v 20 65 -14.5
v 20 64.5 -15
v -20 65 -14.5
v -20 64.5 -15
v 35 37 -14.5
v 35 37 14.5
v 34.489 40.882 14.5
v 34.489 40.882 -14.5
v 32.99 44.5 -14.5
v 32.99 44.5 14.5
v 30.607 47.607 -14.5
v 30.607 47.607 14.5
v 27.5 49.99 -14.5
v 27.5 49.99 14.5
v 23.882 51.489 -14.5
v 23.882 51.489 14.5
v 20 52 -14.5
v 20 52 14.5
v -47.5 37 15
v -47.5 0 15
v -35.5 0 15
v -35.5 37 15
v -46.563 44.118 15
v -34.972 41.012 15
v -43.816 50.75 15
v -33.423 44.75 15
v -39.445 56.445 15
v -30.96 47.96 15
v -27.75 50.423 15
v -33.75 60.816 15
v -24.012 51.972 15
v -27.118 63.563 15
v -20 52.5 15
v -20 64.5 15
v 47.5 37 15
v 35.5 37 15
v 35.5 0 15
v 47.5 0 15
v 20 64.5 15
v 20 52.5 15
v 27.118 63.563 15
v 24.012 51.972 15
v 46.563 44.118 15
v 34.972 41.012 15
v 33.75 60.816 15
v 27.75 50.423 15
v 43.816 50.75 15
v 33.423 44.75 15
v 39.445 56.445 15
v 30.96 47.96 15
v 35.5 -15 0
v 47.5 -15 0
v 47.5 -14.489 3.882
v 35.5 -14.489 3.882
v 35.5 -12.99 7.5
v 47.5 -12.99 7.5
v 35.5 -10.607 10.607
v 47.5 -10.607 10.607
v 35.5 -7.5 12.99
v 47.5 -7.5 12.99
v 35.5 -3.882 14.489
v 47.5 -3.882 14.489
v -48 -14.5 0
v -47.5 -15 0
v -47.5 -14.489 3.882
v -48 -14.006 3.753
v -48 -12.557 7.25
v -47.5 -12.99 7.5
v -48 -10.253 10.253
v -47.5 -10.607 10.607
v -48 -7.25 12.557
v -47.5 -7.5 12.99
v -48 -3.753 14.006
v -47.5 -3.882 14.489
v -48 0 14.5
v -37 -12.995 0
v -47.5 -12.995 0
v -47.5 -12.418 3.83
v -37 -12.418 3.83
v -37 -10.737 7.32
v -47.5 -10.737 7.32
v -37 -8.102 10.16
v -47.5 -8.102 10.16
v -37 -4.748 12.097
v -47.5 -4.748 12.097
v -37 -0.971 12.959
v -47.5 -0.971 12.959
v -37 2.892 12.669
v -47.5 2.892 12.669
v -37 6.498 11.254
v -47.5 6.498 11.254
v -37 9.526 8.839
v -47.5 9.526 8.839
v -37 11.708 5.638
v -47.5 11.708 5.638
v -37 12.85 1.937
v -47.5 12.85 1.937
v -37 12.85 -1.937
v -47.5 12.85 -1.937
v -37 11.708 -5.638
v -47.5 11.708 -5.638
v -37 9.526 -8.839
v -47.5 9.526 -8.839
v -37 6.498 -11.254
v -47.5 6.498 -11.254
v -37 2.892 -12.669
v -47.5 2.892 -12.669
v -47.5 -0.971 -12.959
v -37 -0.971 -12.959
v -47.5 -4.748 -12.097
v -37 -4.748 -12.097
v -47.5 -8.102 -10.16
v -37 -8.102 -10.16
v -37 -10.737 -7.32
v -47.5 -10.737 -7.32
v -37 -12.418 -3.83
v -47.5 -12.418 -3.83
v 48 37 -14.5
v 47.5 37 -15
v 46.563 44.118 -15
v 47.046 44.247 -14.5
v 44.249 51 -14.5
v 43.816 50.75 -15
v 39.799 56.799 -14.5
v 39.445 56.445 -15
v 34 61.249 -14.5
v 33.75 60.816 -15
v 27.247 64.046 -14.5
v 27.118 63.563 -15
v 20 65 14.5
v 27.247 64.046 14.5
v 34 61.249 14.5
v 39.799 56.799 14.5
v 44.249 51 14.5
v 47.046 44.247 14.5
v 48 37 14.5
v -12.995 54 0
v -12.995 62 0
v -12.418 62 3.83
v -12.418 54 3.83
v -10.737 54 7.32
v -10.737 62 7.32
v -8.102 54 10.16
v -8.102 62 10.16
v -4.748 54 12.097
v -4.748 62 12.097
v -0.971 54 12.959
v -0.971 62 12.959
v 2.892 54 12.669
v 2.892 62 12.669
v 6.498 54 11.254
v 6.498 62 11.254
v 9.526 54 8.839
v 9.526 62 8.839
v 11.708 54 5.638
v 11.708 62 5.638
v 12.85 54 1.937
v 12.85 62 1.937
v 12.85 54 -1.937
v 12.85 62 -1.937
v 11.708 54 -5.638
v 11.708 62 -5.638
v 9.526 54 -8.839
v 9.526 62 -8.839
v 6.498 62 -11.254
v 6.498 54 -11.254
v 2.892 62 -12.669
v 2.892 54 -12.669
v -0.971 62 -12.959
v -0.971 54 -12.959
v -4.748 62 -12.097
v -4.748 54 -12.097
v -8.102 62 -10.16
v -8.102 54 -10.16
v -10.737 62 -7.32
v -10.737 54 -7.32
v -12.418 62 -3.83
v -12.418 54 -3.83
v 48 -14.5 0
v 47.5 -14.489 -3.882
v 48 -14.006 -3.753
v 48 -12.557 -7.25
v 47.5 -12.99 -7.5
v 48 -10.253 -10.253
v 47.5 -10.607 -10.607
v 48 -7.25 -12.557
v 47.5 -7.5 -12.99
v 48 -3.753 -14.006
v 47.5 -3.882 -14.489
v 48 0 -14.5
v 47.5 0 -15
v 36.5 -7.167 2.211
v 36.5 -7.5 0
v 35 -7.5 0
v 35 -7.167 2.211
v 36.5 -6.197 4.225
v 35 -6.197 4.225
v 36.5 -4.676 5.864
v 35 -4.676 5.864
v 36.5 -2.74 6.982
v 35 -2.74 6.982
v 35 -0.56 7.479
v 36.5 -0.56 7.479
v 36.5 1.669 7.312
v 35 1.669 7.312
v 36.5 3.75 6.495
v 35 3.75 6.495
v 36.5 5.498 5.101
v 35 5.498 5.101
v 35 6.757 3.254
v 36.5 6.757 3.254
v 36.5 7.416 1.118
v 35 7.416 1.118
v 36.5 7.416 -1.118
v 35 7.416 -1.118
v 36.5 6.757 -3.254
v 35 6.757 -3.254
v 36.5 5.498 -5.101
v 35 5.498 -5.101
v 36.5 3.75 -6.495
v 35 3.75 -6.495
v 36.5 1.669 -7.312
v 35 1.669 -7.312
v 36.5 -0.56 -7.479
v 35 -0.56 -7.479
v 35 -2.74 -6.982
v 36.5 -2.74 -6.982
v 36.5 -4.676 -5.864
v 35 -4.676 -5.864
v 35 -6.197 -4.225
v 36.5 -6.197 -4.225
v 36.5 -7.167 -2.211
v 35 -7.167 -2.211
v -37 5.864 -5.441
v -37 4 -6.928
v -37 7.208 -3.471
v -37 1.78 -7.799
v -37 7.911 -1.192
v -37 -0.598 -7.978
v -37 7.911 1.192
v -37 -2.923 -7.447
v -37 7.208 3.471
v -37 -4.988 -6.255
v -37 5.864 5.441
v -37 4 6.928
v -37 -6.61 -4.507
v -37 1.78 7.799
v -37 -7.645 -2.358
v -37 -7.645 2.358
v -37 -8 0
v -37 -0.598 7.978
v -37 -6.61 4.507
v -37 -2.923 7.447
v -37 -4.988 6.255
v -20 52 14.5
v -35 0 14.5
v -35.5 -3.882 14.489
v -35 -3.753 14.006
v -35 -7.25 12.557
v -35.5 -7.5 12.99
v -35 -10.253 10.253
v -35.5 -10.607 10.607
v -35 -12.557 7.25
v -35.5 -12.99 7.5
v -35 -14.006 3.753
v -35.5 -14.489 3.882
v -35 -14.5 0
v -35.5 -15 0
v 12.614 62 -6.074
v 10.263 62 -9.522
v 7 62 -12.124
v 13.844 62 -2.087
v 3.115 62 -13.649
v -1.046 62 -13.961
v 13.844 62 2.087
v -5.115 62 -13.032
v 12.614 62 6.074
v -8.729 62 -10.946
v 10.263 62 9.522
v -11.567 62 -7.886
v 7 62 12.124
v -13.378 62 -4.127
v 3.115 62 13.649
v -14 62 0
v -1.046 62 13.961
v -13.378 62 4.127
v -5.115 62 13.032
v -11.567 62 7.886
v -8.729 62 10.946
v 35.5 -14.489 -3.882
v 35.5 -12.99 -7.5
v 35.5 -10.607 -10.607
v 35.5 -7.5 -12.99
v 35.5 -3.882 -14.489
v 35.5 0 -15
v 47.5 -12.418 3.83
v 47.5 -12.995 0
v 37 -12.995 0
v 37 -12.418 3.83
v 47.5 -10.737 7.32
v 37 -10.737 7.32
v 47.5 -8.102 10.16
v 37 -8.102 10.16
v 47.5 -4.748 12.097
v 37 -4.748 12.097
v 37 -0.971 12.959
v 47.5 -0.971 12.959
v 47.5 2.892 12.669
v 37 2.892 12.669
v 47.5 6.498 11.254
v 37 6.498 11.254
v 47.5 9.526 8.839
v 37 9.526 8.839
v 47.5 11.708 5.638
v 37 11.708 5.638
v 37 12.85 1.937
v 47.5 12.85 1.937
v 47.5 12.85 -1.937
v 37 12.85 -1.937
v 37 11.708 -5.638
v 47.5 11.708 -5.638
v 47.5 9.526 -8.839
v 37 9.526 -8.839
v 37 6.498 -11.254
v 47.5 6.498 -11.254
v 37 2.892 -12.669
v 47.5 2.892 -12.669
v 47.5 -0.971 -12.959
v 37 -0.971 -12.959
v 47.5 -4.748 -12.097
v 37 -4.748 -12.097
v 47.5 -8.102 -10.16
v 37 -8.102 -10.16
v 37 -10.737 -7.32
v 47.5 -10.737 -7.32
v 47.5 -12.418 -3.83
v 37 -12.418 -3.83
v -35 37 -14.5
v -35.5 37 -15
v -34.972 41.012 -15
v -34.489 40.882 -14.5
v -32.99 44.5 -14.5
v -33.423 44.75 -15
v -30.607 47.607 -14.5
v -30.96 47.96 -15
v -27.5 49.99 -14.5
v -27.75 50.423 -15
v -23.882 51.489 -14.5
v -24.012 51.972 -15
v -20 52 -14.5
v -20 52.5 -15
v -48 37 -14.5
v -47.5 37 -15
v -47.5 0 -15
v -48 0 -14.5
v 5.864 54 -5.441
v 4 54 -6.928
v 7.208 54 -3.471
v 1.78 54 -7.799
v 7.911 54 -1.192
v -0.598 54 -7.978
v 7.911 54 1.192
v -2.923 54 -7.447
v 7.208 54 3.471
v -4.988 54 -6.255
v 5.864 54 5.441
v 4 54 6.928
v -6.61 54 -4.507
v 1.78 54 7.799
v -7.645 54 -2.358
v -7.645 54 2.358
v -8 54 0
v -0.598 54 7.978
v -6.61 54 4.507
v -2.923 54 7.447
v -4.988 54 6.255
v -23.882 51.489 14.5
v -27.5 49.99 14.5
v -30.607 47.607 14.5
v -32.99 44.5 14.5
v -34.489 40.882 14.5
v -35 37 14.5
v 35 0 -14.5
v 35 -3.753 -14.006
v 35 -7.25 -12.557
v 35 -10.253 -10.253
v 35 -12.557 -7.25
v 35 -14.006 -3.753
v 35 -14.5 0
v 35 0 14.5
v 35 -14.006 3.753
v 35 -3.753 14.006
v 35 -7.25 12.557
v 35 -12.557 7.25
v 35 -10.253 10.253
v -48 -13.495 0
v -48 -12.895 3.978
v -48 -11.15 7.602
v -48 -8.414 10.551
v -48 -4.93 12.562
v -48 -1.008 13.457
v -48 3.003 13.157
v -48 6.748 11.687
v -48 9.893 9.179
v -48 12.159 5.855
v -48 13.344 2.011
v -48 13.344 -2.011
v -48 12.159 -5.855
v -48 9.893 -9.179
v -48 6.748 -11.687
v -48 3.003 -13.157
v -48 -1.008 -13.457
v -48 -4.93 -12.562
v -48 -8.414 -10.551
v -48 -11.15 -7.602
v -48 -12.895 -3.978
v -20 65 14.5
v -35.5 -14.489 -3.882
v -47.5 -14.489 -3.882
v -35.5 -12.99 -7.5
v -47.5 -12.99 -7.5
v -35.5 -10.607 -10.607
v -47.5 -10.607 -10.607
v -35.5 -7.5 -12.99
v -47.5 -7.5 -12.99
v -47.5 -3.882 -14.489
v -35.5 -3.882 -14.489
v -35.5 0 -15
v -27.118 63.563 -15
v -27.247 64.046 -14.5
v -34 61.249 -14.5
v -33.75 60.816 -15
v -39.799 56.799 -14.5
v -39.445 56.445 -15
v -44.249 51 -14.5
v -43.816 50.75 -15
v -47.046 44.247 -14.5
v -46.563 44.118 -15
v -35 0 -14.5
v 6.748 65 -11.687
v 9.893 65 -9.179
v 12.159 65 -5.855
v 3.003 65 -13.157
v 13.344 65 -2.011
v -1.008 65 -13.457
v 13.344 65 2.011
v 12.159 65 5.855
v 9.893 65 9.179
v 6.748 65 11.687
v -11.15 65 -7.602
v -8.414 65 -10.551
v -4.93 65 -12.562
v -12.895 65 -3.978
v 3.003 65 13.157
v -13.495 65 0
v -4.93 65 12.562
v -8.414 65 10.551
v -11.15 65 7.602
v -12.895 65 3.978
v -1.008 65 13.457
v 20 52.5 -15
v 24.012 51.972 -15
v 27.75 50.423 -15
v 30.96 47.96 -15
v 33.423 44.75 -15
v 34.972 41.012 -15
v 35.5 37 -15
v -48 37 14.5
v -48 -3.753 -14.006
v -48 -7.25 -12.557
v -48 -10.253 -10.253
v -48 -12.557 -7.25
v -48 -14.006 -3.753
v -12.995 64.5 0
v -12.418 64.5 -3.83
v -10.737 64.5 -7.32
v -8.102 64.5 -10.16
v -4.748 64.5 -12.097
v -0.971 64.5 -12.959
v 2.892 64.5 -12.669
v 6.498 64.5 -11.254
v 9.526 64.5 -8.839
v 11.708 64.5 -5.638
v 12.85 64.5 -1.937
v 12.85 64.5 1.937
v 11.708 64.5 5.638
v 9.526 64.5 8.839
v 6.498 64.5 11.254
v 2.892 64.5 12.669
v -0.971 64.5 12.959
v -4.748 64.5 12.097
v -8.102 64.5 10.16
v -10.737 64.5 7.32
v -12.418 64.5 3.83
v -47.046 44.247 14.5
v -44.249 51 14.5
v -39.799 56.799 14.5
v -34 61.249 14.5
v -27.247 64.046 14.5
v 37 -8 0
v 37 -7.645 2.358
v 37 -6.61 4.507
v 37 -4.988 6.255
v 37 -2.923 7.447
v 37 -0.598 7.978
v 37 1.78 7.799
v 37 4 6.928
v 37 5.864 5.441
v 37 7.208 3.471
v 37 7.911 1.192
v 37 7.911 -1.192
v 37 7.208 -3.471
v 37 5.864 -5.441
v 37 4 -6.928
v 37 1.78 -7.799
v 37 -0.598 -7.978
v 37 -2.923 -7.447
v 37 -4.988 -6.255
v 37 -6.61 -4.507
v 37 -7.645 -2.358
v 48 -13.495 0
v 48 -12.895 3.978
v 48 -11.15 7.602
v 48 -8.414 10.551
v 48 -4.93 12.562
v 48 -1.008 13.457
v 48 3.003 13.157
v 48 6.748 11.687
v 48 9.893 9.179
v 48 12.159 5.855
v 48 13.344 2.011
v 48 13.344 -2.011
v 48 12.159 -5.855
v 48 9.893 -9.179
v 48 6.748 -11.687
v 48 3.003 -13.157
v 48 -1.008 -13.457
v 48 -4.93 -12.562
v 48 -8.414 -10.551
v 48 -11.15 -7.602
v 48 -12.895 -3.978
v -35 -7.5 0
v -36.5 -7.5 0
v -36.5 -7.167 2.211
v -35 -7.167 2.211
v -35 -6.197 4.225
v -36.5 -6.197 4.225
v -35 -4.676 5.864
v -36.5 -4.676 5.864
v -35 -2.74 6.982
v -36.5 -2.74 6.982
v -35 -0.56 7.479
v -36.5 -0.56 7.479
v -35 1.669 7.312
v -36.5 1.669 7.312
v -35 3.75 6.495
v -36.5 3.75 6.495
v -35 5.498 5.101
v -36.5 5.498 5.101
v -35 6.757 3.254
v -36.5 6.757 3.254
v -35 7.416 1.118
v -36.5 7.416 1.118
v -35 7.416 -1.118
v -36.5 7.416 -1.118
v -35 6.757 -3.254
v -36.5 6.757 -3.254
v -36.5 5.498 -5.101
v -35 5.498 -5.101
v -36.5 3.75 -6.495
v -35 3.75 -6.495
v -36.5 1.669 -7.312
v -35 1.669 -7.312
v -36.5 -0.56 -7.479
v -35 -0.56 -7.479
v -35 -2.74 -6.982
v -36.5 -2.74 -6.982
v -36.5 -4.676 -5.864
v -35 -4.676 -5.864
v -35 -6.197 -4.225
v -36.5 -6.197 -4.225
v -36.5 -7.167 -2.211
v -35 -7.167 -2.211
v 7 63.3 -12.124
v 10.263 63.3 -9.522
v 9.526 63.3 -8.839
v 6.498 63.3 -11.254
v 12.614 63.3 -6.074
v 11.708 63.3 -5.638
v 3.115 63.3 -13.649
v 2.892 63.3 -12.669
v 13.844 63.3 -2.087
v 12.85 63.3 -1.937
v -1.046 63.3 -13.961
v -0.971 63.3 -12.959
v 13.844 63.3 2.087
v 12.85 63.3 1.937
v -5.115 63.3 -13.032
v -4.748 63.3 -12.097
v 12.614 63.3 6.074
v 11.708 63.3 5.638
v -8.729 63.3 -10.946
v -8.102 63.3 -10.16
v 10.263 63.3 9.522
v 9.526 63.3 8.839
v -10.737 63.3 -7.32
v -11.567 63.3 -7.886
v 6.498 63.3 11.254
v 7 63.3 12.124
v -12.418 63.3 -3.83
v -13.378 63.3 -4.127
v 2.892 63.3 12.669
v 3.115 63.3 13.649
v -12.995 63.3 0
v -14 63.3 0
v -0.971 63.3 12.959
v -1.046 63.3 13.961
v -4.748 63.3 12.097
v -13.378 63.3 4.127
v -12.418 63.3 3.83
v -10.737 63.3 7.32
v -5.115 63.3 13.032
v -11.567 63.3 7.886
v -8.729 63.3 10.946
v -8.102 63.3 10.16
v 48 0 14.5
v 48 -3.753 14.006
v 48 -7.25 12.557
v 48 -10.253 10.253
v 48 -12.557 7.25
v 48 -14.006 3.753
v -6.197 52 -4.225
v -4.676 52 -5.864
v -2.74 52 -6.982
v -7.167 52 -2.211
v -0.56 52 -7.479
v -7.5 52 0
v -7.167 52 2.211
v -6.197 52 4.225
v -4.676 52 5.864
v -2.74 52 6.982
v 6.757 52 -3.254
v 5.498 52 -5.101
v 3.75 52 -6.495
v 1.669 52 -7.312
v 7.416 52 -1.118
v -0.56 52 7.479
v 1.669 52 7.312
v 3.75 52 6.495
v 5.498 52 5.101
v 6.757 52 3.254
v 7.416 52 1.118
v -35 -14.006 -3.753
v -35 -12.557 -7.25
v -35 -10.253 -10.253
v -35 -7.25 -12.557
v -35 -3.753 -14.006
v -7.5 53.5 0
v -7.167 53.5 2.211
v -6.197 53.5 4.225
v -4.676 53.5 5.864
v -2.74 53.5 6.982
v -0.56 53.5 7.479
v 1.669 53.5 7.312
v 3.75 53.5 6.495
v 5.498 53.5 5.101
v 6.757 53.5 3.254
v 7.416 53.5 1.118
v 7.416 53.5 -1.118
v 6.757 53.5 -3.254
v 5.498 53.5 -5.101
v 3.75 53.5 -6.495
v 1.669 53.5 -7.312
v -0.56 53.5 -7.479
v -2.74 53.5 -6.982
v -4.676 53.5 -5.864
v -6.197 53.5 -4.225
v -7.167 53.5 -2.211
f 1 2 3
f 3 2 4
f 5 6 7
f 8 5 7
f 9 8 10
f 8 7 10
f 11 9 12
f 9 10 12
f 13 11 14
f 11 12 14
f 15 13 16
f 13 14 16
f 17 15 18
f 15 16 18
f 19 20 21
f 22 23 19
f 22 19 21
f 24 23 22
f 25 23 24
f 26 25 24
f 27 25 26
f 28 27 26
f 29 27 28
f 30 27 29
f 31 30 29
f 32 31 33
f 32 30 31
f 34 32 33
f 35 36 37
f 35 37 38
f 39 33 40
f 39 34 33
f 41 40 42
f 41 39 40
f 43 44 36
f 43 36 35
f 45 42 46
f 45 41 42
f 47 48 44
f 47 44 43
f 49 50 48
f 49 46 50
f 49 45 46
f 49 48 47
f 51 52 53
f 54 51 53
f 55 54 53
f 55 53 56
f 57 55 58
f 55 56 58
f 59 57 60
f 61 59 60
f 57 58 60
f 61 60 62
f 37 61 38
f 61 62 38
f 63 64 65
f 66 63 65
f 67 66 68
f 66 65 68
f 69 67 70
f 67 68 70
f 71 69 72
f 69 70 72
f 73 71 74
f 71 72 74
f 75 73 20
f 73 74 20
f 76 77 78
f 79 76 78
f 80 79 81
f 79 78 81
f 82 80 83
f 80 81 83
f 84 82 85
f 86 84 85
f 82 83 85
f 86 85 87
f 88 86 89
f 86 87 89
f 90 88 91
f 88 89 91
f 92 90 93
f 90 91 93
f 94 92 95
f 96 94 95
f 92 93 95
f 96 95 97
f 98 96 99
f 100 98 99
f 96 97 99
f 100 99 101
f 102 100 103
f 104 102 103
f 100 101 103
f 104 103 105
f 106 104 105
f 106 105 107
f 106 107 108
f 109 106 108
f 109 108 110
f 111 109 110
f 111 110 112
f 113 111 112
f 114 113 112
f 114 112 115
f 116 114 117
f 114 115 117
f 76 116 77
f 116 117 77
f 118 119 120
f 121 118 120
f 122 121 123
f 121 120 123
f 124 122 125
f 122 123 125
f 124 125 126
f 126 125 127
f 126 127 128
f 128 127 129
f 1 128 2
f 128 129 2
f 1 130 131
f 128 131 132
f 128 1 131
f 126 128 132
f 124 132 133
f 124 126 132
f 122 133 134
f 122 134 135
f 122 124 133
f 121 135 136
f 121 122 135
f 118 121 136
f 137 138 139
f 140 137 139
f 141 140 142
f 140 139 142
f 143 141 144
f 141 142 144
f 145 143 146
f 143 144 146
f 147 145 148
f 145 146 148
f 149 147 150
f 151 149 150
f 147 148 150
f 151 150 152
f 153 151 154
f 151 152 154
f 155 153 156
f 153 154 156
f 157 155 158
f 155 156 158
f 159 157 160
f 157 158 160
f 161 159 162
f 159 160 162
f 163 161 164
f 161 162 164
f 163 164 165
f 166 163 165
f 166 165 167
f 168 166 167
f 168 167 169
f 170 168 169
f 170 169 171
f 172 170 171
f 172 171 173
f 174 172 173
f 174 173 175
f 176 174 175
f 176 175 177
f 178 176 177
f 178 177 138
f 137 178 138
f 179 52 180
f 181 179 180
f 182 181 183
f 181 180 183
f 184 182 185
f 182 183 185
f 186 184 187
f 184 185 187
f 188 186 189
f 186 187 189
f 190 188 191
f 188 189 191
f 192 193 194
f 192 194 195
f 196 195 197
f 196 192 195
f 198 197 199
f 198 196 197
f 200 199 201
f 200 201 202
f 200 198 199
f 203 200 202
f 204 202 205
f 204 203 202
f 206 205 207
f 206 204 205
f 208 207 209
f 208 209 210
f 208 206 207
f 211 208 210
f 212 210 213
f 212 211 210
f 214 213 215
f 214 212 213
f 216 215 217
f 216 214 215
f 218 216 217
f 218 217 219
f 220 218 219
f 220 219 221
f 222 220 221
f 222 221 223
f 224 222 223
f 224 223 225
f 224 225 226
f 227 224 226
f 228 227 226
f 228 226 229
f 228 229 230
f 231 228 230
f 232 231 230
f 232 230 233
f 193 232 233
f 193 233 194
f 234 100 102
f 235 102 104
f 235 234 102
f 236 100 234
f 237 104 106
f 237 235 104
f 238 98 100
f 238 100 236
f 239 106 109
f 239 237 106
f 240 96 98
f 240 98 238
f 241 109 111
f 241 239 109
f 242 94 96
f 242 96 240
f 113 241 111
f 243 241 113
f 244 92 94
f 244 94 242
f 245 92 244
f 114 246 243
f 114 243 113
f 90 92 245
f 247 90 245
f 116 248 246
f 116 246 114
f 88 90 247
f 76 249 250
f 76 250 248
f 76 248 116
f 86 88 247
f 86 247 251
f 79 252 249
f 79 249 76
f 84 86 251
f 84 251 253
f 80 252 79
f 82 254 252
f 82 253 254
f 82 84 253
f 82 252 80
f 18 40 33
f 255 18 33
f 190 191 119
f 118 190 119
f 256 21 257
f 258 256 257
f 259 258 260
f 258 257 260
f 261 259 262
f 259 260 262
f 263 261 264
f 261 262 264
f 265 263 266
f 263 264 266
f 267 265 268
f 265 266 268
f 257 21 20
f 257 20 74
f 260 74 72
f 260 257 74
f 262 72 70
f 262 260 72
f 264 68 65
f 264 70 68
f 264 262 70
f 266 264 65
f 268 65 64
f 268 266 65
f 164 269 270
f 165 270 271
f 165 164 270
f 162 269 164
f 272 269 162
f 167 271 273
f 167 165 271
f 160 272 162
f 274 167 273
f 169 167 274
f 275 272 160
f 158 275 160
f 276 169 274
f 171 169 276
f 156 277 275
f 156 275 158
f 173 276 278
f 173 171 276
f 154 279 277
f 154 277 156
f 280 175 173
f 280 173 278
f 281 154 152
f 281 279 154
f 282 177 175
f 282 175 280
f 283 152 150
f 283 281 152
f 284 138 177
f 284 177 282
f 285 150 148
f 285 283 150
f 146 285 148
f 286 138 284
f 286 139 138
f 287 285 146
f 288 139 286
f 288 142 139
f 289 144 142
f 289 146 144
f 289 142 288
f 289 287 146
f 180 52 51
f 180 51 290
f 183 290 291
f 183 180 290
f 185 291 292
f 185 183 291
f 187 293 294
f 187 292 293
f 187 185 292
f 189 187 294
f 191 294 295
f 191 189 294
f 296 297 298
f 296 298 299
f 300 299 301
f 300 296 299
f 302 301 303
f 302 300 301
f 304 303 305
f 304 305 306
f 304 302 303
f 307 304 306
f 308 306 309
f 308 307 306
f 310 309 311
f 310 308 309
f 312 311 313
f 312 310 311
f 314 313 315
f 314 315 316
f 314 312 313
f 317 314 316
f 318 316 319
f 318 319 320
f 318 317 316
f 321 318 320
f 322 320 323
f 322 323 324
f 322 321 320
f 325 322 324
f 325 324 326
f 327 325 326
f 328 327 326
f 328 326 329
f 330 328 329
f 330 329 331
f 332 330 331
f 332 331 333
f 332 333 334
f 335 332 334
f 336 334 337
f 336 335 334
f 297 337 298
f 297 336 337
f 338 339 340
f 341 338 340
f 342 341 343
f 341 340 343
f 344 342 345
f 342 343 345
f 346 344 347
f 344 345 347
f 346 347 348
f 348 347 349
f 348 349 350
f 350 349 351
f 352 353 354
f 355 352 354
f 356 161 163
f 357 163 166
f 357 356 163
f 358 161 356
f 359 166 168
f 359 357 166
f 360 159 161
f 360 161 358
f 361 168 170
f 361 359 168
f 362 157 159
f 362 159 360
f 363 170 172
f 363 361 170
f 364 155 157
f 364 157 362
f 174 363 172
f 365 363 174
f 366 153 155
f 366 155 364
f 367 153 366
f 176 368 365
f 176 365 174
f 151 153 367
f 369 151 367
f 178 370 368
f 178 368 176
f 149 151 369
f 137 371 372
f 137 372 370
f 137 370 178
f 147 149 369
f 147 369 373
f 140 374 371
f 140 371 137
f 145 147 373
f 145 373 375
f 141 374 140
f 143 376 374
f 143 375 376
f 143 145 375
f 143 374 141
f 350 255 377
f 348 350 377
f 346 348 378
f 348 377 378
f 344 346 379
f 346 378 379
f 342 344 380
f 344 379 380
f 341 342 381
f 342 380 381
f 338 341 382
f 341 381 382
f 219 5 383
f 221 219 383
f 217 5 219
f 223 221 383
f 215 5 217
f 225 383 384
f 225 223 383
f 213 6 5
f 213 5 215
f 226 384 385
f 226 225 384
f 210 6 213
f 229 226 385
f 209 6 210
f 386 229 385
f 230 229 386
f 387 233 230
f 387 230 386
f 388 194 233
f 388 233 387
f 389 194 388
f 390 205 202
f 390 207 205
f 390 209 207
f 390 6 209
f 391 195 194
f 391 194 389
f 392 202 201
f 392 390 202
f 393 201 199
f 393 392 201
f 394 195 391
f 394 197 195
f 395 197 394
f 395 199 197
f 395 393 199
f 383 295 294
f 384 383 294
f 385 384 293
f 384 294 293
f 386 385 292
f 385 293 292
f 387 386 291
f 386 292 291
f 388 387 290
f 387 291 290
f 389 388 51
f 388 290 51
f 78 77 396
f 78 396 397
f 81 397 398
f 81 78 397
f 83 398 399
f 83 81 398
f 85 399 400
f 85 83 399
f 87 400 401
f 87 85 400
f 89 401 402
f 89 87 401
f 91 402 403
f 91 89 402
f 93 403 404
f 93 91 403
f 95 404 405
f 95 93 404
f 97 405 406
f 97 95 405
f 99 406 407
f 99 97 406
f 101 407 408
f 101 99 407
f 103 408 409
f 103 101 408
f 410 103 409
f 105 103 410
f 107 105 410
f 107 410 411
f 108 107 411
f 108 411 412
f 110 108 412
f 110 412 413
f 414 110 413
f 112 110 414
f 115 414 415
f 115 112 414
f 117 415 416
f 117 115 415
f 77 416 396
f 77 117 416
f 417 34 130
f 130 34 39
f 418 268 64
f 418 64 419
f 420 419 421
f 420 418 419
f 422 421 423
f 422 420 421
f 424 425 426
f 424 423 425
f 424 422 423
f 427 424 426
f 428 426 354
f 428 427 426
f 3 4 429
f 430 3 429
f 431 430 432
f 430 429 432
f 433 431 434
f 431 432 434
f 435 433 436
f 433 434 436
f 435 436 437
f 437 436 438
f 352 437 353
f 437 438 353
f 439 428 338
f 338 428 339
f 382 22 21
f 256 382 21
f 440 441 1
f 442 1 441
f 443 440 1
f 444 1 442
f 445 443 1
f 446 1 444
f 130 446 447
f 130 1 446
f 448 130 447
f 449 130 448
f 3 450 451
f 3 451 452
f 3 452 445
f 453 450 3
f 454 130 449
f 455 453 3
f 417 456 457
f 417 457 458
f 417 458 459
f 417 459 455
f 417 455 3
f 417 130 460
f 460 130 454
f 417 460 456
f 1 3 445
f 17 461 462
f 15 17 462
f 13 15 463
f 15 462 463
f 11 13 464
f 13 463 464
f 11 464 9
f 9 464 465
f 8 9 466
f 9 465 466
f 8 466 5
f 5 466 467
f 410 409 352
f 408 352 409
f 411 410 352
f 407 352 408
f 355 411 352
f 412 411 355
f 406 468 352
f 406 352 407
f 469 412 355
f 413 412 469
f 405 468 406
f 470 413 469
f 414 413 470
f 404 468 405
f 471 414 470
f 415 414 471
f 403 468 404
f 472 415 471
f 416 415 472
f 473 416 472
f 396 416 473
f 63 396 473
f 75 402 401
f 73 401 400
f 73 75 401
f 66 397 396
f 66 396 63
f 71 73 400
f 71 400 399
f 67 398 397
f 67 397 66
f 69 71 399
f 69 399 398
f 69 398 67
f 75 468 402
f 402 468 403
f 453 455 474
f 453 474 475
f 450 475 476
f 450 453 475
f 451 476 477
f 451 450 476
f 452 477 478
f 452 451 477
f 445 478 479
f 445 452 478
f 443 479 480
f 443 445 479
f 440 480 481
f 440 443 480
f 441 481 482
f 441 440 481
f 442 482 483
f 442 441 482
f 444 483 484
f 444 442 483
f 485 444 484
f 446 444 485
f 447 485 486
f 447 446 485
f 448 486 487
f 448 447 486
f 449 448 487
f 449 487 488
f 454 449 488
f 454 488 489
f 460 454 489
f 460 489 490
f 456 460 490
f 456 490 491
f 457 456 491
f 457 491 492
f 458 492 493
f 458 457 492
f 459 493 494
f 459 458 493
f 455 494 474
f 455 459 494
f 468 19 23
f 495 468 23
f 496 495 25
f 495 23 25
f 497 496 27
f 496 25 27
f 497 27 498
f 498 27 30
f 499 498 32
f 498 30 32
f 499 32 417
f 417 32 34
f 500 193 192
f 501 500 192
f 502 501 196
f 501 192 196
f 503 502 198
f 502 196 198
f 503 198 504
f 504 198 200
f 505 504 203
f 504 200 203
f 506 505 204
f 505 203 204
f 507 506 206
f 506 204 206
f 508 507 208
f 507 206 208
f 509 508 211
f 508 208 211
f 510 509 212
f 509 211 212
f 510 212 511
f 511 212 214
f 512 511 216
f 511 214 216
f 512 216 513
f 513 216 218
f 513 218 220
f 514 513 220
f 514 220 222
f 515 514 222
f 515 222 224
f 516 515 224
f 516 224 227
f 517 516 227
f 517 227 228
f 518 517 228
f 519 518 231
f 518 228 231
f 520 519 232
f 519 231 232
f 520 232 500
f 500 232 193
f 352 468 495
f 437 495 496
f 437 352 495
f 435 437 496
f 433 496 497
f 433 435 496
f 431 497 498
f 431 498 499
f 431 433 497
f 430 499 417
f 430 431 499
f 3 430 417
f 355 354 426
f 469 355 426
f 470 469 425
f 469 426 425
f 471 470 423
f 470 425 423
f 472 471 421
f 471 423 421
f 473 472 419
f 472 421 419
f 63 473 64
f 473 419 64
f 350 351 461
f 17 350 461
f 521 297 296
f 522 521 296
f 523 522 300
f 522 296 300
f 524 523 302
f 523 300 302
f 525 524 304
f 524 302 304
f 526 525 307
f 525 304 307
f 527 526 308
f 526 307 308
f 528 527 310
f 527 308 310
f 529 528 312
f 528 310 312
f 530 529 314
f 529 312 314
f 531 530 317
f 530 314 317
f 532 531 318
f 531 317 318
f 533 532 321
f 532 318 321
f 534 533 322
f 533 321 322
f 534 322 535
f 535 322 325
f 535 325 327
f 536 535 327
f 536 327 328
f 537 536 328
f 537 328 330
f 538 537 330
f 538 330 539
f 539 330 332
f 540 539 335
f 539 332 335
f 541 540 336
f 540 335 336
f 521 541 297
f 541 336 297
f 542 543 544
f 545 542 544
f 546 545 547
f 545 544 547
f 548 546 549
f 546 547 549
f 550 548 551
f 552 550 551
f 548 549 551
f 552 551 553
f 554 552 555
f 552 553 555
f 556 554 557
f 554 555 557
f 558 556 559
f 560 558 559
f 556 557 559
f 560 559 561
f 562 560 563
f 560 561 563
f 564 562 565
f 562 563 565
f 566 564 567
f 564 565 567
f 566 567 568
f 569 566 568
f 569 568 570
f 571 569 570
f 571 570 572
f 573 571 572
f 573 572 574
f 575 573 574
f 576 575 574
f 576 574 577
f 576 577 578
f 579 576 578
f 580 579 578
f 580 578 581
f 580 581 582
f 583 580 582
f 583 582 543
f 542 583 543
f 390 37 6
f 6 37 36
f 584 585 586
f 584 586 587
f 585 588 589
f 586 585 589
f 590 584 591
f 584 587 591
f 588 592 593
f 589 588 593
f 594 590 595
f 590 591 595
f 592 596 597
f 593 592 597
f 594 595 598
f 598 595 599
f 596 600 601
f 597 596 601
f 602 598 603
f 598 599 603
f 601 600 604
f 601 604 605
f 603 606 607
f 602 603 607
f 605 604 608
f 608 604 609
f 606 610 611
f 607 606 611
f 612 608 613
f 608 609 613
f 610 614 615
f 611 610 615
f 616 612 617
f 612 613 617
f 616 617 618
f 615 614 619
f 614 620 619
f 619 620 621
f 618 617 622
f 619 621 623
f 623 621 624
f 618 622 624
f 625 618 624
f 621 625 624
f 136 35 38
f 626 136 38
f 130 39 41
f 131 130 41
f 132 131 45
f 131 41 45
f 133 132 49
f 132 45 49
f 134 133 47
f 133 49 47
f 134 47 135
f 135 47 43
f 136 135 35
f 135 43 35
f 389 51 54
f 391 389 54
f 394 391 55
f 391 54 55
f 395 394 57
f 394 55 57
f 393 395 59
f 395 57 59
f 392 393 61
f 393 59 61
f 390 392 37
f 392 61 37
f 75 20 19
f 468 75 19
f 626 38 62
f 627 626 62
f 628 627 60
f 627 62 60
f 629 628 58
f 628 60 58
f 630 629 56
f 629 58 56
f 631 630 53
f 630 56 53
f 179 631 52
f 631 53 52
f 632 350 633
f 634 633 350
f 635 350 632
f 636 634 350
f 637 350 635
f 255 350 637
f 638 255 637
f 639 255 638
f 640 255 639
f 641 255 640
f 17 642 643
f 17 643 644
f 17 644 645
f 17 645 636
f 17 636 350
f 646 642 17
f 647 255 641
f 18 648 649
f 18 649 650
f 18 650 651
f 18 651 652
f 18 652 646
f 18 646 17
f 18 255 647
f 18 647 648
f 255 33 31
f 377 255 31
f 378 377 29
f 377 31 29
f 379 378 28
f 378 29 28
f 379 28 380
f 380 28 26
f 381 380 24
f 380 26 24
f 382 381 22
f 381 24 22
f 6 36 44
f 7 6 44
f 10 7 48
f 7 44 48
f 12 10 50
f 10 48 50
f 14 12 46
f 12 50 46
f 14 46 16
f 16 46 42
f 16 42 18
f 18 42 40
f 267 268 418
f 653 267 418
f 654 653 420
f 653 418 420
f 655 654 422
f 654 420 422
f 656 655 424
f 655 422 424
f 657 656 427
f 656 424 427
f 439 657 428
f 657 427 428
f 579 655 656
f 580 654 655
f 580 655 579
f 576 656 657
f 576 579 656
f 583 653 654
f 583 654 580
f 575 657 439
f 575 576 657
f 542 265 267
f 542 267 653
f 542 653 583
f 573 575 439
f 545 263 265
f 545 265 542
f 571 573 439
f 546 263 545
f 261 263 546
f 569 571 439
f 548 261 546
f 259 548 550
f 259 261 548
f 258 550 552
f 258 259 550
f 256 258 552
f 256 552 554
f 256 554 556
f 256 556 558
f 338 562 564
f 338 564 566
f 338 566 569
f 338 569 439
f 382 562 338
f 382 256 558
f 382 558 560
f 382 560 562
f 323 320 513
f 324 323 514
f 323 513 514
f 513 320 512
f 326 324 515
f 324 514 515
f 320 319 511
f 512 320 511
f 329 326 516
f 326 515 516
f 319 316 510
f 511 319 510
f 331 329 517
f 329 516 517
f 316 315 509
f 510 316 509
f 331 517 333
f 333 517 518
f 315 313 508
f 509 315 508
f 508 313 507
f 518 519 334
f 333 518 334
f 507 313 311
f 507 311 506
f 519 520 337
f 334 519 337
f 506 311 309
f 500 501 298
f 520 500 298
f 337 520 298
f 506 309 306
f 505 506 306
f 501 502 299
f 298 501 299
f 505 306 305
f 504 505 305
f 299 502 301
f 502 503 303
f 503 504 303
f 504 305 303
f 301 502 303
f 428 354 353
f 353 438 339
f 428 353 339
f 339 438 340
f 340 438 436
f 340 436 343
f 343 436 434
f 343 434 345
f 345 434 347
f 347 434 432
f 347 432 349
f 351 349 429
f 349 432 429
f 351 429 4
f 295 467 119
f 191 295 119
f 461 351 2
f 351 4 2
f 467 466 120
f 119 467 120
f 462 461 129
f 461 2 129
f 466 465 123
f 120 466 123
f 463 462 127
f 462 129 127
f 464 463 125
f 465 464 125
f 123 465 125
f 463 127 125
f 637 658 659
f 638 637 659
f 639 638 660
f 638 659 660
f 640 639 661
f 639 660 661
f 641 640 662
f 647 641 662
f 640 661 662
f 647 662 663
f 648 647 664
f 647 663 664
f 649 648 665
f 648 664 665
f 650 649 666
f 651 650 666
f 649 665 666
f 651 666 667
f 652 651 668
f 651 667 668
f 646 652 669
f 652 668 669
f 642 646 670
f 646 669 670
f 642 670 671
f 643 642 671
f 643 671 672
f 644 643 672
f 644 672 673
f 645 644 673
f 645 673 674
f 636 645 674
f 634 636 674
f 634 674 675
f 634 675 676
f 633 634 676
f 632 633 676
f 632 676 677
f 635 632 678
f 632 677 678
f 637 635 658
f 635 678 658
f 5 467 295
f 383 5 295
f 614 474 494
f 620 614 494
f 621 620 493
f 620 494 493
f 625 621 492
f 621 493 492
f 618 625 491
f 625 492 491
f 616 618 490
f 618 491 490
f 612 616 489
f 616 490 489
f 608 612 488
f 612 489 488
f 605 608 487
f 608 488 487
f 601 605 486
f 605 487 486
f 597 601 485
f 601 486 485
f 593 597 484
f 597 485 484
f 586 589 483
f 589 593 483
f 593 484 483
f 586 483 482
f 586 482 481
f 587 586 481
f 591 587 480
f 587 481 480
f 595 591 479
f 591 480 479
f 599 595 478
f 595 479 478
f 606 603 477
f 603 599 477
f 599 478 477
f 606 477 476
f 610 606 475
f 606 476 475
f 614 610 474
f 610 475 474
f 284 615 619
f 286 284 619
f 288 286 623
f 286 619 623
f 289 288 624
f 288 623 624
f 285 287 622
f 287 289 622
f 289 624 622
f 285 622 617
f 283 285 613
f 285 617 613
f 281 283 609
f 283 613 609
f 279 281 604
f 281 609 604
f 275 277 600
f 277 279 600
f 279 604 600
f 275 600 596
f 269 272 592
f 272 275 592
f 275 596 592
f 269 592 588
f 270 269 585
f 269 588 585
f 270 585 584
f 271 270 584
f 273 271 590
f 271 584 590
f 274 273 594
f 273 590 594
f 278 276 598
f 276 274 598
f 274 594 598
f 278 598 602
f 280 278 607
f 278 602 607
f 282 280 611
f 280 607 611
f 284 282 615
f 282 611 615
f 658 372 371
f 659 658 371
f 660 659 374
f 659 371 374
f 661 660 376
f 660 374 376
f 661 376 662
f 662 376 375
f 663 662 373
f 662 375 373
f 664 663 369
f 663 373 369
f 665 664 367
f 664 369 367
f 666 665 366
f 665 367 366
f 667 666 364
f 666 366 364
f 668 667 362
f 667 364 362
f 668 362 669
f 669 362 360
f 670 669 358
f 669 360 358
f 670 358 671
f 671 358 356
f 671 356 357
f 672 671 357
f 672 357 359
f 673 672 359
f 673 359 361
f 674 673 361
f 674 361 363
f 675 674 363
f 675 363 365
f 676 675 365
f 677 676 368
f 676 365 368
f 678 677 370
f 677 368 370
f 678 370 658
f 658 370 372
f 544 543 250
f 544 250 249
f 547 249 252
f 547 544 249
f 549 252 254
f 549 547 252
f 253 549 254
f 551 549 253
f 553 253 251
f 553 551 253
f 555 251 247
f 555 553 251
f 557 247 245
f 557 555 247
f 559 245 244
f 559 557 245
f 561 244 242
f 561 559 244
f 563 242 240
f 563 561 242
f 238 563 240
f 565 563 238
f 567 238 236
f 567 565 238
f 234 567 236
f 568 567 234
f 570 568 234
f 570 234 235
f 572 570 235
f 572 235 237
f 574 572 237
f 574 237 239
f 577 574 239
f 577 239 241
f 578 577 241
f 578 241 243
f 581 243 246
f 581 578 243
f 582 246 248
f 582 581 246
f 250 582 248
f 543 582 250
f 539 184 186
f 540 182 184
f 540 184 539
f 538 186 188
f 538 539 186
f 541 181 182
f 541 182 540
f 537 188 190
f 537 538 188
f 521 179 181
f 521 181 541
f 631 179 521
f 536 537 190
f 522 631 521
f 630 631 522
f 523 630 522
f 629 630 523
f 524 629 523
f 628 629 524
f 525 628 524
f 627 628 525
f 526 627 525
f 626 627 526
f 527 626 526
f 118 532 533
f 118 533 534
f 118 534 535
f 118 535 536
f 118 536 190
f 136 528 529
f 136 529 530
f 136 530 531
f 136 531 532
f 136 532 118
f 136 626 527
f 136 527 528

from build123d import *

# Parameters (mm, degrees)
F0_W          = 30
F0_H          = 13
F0_W_2        = 13
F0_H_2        = 30
F1_DEPTH      = 15
F1_DEPTH_BACK = 15
F2_R          = 14.99999
F3_R          = 28
F4_R          = 12.995
F4_R_2        = 7.5
F5_DEPTH      = 11
F6_DEPTH      = 13
F7_R          = 12.995
F7_R_2        = 7.5
F8_DEPTH      = 11
F9_DEPTH      = 13
F10_START     = -1.7
F7_R_3        = 14
F10_DEPTH     = 1.3
F12_SIZE      = 0.5


# Not quite as in the source:
# - a fillet or chamfer is up to 0.001 mm smaller than in the source, because OpenCascade refuses the exact size


with BuildPart() as f1:
    # F0 (on Top) → F1 (new body, two sides)
    with BuildSketch(Plane.XY) as f1_sk:
        with Locations((0, 58.5)):
            Rectangle(F0_W, F0_H)
        Polygon((-48, 15), (-35, 15), (-35, 52), (-15, 52), (-15, 65), (-48, 65), align=None)
        with Locations((-41.5, 0)):
            Rectangle(F0_W_2, F0_H_2)
        Polygon((35, 52), (35, 15), (48, 15), (48, 65), (15, 65), (15, 52), align=None)
        with Locations((41.5, 0)):
            Rectangle(F0_W_2, F0_H_2)
    extrude(amount=F1_DEPTH)
    extrude(f1_sk.sketch, amount=-F1_DEPTH_BACK)

    # F2 (radius 15 in the source; OpenCascade refuses exactly that, so slightly less here)
    f2_edges = [f1.edges().sort_by_distance(p)[0] for p in [
        (-41.5, -15, 15),
        (-41.5, -15, -15),
        (41.5, -15, 15),
        (41.5, -15, -15),
        (-35, 52, 0),
        (35, 52, 0),
    ]]
    fillet(f2_edges, radius=F2_R)

    # F3
    f3_edges = [f1.edges().sort_by_distance(p)[0] for p in [
        (48, 65, 0),
        (-48, 65, 0),
    ]]
    fillet(f3_edges, radius=F3_R)

    # F4 (on face) → F5 (cut)
    with BuildSketch(Plane(origin=(-48, 0, 0), x_dir=(0, -1, 0), z_dir=(-1, 0, 0))):
        Circle(F4_R)
        Circle(F4_R_2, mode=Mode.SUBTRACT)
        Circle(F4_R_2)
    extrude(amount=-F5_DEPTH, mode=Mode.SUBTRACT)

    # F4 (on face) → F6 (cut)
    with BuildSketch(Plane(origin=(-48, 0, 0), x_dir=(0, -1, 0), z_dir=(-1, 0, 0))):
        Circle(F4_R_2)
    extrude(amount=-F6_DEPTH, mode=Mode.SUBTRACT)

    # F7 (on face) → F8 (cut)
    with BuildSketch(Plane(origin=(0, 65, 0), x_dir=(-1, 0, 0), z_dir=(0, 1, 0))):
        Circle(F7_R)
        Circle(F7_R_2, mode=Mode.SUBTRACT)
        Circle(F7_R_2)
    extrude(amount=-F8_DEPTH, mode=Mode.SUBTRACT)

    # F7 (on face) → F9 (cut)
    with BuildSketch(Plane(origin=(0, 65, 0), x_dir=(-1, 0, 0), z_dir=(0, 1, 0))):
        Circle(F7_R_2)
    extrude(amount=-F9_DEPTH, mode=Mode.SUBTRACT)

    # F7 (on face) → F10 (cut)
    with BuildSketch(Plane(origin=(0, 65, 0), x_dir=(-1, 0, 0), z_dir=(0, 1, 0)).offset(F10_START)):
        Circle(F7_R_3)
        Circle(F7_R, mode=Mode.SUBTRACT)
    extrude(amount=-F10_DEPTH, mode=Mode.SUBTRACT)

    # F11: F1 across plane


with BuildPart() as f1_1:
    add(f1.part)
    add(f1.part.mirror(Plane.YZ), mode=Mode.INTERSECT)

    # F12
    f12_edges = [f1_1.edges().sort_by_distance(p)[0] for p in [
        (-30.606605, 47.606605, 15),
        (0, 65, -15),
        (-48, 12.995, 0),
        (-37, 7.5, 0),
        (48, 12.995, 0),
        (37, 7.5, 0),
        (12.995, 65, 0),
        (7.5, 54, 0),
        (-48, 18.499995, 15),
        (-48, -10.606605, 10.606605),
        (-48, 18.499995, -15),
        (-48, -15, 0),
        (-48, -10.606605, -10.606605),
        (-35, 18.5, 15),
        (-35, -10.606605, 10.606605),
        (-35, -15, 0),
        (-35, 18.5, -15),
        (-35, -10.606605, -10.606605),
        (-30.606605, 47.606605, -15),
        (0, 52, 15),
        (0, 52, -15),
        (0, 65, 15),
        (39.79899, 56.79899, 15),
        (39.79899, 56.79899, -15),
        (48, 18.499995, 15),
        (48, -10.606605, 10.606605),
        (48, -15, 0),
        (48, 18.499995, -15),
        (48, -10.606605, -10.606605),
        (35, 18.5, 15),
        (35, -10.606605, 10.606605),
        (35, 18.5, -15),
        (35, -15, 0),
        (35, -10.606605, -10.606605),
        (30.606605, 47.606605, -15),
        (30.606605, 47.606605, 15),
        (-39.79899, 56.79899, -15),
        (-39.79899, 56.79899, 15),
    ]]
    chamfer(f12_edges, length=F12_SIZE)


solid = f1_1.part
